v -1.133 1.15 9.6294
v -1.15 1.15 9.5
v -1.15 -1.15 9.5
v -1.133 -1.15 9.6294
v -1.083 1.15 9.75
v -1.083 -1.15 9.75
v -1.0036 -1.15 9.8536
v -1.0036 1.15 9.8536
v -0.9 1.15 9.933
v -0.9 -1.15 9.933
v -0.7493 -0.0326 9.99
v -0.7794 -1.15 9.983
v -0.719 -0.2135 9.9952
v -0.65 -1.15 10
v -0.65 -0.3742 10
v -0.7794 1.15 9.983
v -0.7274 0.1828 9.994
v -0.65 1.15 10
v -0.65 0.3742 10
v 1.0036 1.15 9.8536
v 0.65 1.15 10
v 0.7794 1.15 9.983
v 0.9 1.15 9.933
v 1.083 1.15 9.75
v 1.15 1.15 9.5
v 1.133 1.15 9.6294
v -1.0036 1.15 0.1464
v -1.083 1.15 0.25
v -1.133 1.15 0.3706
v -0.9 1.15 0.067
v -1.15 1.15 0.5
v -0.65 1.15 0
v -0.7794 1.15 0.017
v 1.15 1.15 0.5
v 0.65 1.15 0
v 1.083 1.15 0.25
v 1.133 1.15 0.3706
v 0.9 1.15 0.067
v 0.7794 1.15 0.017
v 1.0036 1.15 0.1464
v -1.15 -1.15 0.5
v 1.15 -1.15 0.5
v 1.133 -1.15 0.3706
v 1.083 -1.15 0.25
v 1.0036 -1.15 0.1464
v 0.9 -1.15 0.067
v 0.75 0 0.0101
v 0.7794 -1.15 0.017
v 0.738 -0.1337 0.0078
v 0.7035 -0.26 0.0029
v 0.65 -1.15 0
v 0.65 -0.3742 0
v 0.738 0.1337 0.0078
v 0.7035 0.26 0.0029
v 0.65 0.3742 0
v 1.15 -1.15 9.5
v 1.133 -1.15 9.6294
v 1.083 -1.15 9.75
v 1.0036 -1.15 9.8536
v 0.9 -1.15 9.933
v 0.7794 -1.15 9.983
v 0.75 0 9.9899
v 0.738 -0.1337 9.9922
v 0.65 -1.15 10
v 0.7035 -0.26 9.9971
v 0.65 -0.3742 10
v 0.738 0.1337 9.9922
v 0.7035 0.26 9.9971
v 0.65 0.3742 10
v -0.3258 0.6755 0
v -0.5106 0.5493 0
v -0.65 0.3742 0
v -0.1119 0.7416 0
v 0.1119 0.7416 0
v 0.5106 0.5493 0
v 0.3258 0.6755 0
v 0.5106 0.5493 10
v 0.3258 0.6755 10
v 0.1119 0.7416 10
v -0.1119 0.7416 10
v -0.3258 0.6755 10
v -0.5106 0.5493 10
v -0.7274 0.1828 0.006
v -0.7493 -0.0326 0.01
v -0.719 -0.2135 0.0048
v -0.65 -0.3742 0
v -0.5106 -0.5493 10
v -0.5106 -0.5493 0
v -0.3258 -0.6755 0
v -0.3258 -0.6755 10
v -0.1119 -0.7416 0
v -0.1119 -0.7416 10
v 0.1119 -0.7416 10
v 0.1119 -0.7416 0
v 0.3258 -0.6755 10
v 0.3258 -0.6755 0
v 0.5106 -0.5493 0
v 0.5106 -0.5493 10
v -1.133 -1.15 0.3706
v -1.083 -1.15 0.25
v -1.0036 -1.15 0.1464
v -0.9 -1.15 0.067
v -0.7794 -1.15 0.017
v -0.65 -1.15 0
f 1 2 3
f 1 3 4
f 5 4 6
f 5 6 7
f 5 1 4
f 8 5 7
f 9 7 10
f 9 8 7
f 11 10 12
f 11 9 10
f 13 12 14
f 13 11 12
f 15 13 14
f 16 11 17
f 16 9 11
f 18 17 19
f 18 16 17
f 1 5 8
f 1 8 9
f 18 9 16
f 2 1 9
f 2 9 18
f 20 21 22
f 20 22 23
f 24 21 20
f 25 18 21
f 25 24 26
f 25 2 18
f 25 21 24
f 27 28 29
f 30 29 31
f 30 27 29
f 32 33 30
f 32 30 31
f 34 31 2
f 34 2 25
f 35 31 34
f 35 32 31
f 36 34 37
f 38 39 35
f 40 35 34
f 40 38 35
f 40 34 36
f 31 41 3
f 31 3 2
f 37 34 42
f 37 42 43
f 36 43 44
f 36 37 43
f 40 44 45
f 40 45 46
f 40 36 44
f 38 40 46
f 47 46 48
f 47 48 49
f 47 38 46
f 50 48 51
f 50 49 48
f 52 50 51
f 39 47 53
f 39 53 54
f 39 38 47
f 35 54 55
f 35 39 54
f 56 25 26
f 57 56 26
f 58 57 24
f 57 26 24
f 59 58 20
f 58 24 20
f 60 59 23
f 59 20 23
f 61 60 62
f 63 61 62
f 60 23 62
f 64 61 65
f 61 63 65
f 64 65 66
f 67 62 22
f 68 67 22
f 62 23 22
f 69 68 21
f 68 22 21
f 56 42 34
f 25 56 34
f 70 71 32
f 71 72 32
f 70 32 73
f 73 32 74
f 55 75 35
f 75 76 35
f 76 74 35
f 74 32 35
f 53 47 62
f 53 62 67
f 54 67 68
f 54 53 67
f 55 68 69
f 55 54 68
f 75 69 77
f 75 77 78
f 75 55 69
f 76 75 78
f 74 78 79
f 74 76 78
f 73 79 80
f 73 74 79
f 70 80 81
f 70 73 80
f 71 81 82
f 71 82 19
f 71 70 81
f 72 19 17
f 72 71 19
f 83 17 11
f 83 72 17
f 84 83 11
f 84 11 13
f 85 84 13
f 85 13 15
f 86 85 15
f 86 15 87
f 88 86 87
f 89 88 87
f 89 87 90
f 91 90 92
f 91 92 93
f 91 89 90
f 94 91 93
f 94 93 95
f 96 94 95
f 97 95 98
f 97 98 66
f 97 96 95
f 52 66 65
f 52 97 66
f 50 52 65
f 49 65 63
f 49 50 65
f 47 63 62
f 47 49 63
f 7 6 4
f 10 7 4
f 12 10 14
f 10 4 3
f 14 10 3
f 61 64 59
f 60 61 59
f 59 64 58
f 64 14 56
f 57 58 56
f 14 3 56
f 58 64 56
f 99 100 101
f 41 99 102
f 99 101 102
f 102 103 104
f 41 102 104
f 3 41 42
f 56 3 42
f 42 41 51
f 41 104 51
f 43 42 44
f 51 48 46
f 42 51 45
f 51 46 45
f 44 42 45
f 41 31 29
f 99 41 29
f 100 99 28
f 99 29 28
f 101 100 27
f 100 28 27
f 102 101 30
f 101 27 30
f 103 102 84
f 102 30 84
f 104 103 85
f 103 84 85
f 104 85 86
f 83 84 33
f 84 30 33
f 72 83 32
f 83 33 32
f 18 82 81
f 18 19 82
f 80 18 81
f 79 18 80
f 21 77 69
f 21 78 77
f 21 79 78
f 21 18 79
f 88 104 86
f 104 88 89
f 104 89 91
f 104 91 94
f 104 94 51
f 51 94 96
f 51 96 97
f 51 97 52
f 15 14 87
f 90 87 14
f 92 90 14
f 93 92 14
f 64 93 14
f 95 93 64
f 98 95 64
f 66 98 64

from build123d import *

# Parameters (mm, degrees)
F0_W        = 2.3
F0_H        = 2.3
F0_R        = 0.75
F1_DEPTH    = 10
F2_T1_DEPTH = 4.8


# Not quite as in the source:
# - a fillet or chamfer that OpenCascade refuses, or shapes differently, is made with other operations: its cross-section is extruded or revolved along the edge and cut away or added


with BuildPart() as f1:
    # F0 (on Top) → F1 (new body)
    with BuildSketch(Plane.XY):
        Rectangle(F0_W, F0_H)
        Circle(F0_R, mode=Mode.SUBTRACT)
    extrude(amount=F1_DEPTH)

    # F2: fillet of radius 0.5 on 4 edges, made by hand

    # F2_s2 → F2_t1 (cut)
    with BuildSketch(Plane.XZ.offset(-2.4)):
        with BuildLine():
            ThreePointArc((1.15, 9.5), (1.0035533906, 9.8535533906), (0.65, 10))
            Line((0.65, 10), (1.15, 10))
            Line((1.15, 10), (1.15, 9.5))
        make_face()
        with BuildLine():
            ThreePointArc((-1.15, 9.5), (-1.0035533906, 9.8535533906), (-0.65, 10))
            Line((-0.65, 10), (-1.15, 10))
            Line((-1.15, 10), (-1.15, 9.5))
        make_face()
        with BuildLine():
            ThreePointArc((1.15, 0.5), (1.0035533906, 0.1464466094), (0.65, 0))
            Line((0.65, 0), (1.15, 0))
            Line((1.15, 0), (1.15, 0.5))
        make_face()
        with BuildLine():
            ThreePointArc((-1.15, 0.5), (-1.0035533906, 0.1464466094), (-0.65, 0))
            Line((-0.65, 0), (-1.15, 0))
            Line((-1.15, 0), (-1.15, 0.5))
        make_face()
    extrude(amount=F2_T1_DEPTH, mode=Mode.SUBTRACT)


solid = f1.part
